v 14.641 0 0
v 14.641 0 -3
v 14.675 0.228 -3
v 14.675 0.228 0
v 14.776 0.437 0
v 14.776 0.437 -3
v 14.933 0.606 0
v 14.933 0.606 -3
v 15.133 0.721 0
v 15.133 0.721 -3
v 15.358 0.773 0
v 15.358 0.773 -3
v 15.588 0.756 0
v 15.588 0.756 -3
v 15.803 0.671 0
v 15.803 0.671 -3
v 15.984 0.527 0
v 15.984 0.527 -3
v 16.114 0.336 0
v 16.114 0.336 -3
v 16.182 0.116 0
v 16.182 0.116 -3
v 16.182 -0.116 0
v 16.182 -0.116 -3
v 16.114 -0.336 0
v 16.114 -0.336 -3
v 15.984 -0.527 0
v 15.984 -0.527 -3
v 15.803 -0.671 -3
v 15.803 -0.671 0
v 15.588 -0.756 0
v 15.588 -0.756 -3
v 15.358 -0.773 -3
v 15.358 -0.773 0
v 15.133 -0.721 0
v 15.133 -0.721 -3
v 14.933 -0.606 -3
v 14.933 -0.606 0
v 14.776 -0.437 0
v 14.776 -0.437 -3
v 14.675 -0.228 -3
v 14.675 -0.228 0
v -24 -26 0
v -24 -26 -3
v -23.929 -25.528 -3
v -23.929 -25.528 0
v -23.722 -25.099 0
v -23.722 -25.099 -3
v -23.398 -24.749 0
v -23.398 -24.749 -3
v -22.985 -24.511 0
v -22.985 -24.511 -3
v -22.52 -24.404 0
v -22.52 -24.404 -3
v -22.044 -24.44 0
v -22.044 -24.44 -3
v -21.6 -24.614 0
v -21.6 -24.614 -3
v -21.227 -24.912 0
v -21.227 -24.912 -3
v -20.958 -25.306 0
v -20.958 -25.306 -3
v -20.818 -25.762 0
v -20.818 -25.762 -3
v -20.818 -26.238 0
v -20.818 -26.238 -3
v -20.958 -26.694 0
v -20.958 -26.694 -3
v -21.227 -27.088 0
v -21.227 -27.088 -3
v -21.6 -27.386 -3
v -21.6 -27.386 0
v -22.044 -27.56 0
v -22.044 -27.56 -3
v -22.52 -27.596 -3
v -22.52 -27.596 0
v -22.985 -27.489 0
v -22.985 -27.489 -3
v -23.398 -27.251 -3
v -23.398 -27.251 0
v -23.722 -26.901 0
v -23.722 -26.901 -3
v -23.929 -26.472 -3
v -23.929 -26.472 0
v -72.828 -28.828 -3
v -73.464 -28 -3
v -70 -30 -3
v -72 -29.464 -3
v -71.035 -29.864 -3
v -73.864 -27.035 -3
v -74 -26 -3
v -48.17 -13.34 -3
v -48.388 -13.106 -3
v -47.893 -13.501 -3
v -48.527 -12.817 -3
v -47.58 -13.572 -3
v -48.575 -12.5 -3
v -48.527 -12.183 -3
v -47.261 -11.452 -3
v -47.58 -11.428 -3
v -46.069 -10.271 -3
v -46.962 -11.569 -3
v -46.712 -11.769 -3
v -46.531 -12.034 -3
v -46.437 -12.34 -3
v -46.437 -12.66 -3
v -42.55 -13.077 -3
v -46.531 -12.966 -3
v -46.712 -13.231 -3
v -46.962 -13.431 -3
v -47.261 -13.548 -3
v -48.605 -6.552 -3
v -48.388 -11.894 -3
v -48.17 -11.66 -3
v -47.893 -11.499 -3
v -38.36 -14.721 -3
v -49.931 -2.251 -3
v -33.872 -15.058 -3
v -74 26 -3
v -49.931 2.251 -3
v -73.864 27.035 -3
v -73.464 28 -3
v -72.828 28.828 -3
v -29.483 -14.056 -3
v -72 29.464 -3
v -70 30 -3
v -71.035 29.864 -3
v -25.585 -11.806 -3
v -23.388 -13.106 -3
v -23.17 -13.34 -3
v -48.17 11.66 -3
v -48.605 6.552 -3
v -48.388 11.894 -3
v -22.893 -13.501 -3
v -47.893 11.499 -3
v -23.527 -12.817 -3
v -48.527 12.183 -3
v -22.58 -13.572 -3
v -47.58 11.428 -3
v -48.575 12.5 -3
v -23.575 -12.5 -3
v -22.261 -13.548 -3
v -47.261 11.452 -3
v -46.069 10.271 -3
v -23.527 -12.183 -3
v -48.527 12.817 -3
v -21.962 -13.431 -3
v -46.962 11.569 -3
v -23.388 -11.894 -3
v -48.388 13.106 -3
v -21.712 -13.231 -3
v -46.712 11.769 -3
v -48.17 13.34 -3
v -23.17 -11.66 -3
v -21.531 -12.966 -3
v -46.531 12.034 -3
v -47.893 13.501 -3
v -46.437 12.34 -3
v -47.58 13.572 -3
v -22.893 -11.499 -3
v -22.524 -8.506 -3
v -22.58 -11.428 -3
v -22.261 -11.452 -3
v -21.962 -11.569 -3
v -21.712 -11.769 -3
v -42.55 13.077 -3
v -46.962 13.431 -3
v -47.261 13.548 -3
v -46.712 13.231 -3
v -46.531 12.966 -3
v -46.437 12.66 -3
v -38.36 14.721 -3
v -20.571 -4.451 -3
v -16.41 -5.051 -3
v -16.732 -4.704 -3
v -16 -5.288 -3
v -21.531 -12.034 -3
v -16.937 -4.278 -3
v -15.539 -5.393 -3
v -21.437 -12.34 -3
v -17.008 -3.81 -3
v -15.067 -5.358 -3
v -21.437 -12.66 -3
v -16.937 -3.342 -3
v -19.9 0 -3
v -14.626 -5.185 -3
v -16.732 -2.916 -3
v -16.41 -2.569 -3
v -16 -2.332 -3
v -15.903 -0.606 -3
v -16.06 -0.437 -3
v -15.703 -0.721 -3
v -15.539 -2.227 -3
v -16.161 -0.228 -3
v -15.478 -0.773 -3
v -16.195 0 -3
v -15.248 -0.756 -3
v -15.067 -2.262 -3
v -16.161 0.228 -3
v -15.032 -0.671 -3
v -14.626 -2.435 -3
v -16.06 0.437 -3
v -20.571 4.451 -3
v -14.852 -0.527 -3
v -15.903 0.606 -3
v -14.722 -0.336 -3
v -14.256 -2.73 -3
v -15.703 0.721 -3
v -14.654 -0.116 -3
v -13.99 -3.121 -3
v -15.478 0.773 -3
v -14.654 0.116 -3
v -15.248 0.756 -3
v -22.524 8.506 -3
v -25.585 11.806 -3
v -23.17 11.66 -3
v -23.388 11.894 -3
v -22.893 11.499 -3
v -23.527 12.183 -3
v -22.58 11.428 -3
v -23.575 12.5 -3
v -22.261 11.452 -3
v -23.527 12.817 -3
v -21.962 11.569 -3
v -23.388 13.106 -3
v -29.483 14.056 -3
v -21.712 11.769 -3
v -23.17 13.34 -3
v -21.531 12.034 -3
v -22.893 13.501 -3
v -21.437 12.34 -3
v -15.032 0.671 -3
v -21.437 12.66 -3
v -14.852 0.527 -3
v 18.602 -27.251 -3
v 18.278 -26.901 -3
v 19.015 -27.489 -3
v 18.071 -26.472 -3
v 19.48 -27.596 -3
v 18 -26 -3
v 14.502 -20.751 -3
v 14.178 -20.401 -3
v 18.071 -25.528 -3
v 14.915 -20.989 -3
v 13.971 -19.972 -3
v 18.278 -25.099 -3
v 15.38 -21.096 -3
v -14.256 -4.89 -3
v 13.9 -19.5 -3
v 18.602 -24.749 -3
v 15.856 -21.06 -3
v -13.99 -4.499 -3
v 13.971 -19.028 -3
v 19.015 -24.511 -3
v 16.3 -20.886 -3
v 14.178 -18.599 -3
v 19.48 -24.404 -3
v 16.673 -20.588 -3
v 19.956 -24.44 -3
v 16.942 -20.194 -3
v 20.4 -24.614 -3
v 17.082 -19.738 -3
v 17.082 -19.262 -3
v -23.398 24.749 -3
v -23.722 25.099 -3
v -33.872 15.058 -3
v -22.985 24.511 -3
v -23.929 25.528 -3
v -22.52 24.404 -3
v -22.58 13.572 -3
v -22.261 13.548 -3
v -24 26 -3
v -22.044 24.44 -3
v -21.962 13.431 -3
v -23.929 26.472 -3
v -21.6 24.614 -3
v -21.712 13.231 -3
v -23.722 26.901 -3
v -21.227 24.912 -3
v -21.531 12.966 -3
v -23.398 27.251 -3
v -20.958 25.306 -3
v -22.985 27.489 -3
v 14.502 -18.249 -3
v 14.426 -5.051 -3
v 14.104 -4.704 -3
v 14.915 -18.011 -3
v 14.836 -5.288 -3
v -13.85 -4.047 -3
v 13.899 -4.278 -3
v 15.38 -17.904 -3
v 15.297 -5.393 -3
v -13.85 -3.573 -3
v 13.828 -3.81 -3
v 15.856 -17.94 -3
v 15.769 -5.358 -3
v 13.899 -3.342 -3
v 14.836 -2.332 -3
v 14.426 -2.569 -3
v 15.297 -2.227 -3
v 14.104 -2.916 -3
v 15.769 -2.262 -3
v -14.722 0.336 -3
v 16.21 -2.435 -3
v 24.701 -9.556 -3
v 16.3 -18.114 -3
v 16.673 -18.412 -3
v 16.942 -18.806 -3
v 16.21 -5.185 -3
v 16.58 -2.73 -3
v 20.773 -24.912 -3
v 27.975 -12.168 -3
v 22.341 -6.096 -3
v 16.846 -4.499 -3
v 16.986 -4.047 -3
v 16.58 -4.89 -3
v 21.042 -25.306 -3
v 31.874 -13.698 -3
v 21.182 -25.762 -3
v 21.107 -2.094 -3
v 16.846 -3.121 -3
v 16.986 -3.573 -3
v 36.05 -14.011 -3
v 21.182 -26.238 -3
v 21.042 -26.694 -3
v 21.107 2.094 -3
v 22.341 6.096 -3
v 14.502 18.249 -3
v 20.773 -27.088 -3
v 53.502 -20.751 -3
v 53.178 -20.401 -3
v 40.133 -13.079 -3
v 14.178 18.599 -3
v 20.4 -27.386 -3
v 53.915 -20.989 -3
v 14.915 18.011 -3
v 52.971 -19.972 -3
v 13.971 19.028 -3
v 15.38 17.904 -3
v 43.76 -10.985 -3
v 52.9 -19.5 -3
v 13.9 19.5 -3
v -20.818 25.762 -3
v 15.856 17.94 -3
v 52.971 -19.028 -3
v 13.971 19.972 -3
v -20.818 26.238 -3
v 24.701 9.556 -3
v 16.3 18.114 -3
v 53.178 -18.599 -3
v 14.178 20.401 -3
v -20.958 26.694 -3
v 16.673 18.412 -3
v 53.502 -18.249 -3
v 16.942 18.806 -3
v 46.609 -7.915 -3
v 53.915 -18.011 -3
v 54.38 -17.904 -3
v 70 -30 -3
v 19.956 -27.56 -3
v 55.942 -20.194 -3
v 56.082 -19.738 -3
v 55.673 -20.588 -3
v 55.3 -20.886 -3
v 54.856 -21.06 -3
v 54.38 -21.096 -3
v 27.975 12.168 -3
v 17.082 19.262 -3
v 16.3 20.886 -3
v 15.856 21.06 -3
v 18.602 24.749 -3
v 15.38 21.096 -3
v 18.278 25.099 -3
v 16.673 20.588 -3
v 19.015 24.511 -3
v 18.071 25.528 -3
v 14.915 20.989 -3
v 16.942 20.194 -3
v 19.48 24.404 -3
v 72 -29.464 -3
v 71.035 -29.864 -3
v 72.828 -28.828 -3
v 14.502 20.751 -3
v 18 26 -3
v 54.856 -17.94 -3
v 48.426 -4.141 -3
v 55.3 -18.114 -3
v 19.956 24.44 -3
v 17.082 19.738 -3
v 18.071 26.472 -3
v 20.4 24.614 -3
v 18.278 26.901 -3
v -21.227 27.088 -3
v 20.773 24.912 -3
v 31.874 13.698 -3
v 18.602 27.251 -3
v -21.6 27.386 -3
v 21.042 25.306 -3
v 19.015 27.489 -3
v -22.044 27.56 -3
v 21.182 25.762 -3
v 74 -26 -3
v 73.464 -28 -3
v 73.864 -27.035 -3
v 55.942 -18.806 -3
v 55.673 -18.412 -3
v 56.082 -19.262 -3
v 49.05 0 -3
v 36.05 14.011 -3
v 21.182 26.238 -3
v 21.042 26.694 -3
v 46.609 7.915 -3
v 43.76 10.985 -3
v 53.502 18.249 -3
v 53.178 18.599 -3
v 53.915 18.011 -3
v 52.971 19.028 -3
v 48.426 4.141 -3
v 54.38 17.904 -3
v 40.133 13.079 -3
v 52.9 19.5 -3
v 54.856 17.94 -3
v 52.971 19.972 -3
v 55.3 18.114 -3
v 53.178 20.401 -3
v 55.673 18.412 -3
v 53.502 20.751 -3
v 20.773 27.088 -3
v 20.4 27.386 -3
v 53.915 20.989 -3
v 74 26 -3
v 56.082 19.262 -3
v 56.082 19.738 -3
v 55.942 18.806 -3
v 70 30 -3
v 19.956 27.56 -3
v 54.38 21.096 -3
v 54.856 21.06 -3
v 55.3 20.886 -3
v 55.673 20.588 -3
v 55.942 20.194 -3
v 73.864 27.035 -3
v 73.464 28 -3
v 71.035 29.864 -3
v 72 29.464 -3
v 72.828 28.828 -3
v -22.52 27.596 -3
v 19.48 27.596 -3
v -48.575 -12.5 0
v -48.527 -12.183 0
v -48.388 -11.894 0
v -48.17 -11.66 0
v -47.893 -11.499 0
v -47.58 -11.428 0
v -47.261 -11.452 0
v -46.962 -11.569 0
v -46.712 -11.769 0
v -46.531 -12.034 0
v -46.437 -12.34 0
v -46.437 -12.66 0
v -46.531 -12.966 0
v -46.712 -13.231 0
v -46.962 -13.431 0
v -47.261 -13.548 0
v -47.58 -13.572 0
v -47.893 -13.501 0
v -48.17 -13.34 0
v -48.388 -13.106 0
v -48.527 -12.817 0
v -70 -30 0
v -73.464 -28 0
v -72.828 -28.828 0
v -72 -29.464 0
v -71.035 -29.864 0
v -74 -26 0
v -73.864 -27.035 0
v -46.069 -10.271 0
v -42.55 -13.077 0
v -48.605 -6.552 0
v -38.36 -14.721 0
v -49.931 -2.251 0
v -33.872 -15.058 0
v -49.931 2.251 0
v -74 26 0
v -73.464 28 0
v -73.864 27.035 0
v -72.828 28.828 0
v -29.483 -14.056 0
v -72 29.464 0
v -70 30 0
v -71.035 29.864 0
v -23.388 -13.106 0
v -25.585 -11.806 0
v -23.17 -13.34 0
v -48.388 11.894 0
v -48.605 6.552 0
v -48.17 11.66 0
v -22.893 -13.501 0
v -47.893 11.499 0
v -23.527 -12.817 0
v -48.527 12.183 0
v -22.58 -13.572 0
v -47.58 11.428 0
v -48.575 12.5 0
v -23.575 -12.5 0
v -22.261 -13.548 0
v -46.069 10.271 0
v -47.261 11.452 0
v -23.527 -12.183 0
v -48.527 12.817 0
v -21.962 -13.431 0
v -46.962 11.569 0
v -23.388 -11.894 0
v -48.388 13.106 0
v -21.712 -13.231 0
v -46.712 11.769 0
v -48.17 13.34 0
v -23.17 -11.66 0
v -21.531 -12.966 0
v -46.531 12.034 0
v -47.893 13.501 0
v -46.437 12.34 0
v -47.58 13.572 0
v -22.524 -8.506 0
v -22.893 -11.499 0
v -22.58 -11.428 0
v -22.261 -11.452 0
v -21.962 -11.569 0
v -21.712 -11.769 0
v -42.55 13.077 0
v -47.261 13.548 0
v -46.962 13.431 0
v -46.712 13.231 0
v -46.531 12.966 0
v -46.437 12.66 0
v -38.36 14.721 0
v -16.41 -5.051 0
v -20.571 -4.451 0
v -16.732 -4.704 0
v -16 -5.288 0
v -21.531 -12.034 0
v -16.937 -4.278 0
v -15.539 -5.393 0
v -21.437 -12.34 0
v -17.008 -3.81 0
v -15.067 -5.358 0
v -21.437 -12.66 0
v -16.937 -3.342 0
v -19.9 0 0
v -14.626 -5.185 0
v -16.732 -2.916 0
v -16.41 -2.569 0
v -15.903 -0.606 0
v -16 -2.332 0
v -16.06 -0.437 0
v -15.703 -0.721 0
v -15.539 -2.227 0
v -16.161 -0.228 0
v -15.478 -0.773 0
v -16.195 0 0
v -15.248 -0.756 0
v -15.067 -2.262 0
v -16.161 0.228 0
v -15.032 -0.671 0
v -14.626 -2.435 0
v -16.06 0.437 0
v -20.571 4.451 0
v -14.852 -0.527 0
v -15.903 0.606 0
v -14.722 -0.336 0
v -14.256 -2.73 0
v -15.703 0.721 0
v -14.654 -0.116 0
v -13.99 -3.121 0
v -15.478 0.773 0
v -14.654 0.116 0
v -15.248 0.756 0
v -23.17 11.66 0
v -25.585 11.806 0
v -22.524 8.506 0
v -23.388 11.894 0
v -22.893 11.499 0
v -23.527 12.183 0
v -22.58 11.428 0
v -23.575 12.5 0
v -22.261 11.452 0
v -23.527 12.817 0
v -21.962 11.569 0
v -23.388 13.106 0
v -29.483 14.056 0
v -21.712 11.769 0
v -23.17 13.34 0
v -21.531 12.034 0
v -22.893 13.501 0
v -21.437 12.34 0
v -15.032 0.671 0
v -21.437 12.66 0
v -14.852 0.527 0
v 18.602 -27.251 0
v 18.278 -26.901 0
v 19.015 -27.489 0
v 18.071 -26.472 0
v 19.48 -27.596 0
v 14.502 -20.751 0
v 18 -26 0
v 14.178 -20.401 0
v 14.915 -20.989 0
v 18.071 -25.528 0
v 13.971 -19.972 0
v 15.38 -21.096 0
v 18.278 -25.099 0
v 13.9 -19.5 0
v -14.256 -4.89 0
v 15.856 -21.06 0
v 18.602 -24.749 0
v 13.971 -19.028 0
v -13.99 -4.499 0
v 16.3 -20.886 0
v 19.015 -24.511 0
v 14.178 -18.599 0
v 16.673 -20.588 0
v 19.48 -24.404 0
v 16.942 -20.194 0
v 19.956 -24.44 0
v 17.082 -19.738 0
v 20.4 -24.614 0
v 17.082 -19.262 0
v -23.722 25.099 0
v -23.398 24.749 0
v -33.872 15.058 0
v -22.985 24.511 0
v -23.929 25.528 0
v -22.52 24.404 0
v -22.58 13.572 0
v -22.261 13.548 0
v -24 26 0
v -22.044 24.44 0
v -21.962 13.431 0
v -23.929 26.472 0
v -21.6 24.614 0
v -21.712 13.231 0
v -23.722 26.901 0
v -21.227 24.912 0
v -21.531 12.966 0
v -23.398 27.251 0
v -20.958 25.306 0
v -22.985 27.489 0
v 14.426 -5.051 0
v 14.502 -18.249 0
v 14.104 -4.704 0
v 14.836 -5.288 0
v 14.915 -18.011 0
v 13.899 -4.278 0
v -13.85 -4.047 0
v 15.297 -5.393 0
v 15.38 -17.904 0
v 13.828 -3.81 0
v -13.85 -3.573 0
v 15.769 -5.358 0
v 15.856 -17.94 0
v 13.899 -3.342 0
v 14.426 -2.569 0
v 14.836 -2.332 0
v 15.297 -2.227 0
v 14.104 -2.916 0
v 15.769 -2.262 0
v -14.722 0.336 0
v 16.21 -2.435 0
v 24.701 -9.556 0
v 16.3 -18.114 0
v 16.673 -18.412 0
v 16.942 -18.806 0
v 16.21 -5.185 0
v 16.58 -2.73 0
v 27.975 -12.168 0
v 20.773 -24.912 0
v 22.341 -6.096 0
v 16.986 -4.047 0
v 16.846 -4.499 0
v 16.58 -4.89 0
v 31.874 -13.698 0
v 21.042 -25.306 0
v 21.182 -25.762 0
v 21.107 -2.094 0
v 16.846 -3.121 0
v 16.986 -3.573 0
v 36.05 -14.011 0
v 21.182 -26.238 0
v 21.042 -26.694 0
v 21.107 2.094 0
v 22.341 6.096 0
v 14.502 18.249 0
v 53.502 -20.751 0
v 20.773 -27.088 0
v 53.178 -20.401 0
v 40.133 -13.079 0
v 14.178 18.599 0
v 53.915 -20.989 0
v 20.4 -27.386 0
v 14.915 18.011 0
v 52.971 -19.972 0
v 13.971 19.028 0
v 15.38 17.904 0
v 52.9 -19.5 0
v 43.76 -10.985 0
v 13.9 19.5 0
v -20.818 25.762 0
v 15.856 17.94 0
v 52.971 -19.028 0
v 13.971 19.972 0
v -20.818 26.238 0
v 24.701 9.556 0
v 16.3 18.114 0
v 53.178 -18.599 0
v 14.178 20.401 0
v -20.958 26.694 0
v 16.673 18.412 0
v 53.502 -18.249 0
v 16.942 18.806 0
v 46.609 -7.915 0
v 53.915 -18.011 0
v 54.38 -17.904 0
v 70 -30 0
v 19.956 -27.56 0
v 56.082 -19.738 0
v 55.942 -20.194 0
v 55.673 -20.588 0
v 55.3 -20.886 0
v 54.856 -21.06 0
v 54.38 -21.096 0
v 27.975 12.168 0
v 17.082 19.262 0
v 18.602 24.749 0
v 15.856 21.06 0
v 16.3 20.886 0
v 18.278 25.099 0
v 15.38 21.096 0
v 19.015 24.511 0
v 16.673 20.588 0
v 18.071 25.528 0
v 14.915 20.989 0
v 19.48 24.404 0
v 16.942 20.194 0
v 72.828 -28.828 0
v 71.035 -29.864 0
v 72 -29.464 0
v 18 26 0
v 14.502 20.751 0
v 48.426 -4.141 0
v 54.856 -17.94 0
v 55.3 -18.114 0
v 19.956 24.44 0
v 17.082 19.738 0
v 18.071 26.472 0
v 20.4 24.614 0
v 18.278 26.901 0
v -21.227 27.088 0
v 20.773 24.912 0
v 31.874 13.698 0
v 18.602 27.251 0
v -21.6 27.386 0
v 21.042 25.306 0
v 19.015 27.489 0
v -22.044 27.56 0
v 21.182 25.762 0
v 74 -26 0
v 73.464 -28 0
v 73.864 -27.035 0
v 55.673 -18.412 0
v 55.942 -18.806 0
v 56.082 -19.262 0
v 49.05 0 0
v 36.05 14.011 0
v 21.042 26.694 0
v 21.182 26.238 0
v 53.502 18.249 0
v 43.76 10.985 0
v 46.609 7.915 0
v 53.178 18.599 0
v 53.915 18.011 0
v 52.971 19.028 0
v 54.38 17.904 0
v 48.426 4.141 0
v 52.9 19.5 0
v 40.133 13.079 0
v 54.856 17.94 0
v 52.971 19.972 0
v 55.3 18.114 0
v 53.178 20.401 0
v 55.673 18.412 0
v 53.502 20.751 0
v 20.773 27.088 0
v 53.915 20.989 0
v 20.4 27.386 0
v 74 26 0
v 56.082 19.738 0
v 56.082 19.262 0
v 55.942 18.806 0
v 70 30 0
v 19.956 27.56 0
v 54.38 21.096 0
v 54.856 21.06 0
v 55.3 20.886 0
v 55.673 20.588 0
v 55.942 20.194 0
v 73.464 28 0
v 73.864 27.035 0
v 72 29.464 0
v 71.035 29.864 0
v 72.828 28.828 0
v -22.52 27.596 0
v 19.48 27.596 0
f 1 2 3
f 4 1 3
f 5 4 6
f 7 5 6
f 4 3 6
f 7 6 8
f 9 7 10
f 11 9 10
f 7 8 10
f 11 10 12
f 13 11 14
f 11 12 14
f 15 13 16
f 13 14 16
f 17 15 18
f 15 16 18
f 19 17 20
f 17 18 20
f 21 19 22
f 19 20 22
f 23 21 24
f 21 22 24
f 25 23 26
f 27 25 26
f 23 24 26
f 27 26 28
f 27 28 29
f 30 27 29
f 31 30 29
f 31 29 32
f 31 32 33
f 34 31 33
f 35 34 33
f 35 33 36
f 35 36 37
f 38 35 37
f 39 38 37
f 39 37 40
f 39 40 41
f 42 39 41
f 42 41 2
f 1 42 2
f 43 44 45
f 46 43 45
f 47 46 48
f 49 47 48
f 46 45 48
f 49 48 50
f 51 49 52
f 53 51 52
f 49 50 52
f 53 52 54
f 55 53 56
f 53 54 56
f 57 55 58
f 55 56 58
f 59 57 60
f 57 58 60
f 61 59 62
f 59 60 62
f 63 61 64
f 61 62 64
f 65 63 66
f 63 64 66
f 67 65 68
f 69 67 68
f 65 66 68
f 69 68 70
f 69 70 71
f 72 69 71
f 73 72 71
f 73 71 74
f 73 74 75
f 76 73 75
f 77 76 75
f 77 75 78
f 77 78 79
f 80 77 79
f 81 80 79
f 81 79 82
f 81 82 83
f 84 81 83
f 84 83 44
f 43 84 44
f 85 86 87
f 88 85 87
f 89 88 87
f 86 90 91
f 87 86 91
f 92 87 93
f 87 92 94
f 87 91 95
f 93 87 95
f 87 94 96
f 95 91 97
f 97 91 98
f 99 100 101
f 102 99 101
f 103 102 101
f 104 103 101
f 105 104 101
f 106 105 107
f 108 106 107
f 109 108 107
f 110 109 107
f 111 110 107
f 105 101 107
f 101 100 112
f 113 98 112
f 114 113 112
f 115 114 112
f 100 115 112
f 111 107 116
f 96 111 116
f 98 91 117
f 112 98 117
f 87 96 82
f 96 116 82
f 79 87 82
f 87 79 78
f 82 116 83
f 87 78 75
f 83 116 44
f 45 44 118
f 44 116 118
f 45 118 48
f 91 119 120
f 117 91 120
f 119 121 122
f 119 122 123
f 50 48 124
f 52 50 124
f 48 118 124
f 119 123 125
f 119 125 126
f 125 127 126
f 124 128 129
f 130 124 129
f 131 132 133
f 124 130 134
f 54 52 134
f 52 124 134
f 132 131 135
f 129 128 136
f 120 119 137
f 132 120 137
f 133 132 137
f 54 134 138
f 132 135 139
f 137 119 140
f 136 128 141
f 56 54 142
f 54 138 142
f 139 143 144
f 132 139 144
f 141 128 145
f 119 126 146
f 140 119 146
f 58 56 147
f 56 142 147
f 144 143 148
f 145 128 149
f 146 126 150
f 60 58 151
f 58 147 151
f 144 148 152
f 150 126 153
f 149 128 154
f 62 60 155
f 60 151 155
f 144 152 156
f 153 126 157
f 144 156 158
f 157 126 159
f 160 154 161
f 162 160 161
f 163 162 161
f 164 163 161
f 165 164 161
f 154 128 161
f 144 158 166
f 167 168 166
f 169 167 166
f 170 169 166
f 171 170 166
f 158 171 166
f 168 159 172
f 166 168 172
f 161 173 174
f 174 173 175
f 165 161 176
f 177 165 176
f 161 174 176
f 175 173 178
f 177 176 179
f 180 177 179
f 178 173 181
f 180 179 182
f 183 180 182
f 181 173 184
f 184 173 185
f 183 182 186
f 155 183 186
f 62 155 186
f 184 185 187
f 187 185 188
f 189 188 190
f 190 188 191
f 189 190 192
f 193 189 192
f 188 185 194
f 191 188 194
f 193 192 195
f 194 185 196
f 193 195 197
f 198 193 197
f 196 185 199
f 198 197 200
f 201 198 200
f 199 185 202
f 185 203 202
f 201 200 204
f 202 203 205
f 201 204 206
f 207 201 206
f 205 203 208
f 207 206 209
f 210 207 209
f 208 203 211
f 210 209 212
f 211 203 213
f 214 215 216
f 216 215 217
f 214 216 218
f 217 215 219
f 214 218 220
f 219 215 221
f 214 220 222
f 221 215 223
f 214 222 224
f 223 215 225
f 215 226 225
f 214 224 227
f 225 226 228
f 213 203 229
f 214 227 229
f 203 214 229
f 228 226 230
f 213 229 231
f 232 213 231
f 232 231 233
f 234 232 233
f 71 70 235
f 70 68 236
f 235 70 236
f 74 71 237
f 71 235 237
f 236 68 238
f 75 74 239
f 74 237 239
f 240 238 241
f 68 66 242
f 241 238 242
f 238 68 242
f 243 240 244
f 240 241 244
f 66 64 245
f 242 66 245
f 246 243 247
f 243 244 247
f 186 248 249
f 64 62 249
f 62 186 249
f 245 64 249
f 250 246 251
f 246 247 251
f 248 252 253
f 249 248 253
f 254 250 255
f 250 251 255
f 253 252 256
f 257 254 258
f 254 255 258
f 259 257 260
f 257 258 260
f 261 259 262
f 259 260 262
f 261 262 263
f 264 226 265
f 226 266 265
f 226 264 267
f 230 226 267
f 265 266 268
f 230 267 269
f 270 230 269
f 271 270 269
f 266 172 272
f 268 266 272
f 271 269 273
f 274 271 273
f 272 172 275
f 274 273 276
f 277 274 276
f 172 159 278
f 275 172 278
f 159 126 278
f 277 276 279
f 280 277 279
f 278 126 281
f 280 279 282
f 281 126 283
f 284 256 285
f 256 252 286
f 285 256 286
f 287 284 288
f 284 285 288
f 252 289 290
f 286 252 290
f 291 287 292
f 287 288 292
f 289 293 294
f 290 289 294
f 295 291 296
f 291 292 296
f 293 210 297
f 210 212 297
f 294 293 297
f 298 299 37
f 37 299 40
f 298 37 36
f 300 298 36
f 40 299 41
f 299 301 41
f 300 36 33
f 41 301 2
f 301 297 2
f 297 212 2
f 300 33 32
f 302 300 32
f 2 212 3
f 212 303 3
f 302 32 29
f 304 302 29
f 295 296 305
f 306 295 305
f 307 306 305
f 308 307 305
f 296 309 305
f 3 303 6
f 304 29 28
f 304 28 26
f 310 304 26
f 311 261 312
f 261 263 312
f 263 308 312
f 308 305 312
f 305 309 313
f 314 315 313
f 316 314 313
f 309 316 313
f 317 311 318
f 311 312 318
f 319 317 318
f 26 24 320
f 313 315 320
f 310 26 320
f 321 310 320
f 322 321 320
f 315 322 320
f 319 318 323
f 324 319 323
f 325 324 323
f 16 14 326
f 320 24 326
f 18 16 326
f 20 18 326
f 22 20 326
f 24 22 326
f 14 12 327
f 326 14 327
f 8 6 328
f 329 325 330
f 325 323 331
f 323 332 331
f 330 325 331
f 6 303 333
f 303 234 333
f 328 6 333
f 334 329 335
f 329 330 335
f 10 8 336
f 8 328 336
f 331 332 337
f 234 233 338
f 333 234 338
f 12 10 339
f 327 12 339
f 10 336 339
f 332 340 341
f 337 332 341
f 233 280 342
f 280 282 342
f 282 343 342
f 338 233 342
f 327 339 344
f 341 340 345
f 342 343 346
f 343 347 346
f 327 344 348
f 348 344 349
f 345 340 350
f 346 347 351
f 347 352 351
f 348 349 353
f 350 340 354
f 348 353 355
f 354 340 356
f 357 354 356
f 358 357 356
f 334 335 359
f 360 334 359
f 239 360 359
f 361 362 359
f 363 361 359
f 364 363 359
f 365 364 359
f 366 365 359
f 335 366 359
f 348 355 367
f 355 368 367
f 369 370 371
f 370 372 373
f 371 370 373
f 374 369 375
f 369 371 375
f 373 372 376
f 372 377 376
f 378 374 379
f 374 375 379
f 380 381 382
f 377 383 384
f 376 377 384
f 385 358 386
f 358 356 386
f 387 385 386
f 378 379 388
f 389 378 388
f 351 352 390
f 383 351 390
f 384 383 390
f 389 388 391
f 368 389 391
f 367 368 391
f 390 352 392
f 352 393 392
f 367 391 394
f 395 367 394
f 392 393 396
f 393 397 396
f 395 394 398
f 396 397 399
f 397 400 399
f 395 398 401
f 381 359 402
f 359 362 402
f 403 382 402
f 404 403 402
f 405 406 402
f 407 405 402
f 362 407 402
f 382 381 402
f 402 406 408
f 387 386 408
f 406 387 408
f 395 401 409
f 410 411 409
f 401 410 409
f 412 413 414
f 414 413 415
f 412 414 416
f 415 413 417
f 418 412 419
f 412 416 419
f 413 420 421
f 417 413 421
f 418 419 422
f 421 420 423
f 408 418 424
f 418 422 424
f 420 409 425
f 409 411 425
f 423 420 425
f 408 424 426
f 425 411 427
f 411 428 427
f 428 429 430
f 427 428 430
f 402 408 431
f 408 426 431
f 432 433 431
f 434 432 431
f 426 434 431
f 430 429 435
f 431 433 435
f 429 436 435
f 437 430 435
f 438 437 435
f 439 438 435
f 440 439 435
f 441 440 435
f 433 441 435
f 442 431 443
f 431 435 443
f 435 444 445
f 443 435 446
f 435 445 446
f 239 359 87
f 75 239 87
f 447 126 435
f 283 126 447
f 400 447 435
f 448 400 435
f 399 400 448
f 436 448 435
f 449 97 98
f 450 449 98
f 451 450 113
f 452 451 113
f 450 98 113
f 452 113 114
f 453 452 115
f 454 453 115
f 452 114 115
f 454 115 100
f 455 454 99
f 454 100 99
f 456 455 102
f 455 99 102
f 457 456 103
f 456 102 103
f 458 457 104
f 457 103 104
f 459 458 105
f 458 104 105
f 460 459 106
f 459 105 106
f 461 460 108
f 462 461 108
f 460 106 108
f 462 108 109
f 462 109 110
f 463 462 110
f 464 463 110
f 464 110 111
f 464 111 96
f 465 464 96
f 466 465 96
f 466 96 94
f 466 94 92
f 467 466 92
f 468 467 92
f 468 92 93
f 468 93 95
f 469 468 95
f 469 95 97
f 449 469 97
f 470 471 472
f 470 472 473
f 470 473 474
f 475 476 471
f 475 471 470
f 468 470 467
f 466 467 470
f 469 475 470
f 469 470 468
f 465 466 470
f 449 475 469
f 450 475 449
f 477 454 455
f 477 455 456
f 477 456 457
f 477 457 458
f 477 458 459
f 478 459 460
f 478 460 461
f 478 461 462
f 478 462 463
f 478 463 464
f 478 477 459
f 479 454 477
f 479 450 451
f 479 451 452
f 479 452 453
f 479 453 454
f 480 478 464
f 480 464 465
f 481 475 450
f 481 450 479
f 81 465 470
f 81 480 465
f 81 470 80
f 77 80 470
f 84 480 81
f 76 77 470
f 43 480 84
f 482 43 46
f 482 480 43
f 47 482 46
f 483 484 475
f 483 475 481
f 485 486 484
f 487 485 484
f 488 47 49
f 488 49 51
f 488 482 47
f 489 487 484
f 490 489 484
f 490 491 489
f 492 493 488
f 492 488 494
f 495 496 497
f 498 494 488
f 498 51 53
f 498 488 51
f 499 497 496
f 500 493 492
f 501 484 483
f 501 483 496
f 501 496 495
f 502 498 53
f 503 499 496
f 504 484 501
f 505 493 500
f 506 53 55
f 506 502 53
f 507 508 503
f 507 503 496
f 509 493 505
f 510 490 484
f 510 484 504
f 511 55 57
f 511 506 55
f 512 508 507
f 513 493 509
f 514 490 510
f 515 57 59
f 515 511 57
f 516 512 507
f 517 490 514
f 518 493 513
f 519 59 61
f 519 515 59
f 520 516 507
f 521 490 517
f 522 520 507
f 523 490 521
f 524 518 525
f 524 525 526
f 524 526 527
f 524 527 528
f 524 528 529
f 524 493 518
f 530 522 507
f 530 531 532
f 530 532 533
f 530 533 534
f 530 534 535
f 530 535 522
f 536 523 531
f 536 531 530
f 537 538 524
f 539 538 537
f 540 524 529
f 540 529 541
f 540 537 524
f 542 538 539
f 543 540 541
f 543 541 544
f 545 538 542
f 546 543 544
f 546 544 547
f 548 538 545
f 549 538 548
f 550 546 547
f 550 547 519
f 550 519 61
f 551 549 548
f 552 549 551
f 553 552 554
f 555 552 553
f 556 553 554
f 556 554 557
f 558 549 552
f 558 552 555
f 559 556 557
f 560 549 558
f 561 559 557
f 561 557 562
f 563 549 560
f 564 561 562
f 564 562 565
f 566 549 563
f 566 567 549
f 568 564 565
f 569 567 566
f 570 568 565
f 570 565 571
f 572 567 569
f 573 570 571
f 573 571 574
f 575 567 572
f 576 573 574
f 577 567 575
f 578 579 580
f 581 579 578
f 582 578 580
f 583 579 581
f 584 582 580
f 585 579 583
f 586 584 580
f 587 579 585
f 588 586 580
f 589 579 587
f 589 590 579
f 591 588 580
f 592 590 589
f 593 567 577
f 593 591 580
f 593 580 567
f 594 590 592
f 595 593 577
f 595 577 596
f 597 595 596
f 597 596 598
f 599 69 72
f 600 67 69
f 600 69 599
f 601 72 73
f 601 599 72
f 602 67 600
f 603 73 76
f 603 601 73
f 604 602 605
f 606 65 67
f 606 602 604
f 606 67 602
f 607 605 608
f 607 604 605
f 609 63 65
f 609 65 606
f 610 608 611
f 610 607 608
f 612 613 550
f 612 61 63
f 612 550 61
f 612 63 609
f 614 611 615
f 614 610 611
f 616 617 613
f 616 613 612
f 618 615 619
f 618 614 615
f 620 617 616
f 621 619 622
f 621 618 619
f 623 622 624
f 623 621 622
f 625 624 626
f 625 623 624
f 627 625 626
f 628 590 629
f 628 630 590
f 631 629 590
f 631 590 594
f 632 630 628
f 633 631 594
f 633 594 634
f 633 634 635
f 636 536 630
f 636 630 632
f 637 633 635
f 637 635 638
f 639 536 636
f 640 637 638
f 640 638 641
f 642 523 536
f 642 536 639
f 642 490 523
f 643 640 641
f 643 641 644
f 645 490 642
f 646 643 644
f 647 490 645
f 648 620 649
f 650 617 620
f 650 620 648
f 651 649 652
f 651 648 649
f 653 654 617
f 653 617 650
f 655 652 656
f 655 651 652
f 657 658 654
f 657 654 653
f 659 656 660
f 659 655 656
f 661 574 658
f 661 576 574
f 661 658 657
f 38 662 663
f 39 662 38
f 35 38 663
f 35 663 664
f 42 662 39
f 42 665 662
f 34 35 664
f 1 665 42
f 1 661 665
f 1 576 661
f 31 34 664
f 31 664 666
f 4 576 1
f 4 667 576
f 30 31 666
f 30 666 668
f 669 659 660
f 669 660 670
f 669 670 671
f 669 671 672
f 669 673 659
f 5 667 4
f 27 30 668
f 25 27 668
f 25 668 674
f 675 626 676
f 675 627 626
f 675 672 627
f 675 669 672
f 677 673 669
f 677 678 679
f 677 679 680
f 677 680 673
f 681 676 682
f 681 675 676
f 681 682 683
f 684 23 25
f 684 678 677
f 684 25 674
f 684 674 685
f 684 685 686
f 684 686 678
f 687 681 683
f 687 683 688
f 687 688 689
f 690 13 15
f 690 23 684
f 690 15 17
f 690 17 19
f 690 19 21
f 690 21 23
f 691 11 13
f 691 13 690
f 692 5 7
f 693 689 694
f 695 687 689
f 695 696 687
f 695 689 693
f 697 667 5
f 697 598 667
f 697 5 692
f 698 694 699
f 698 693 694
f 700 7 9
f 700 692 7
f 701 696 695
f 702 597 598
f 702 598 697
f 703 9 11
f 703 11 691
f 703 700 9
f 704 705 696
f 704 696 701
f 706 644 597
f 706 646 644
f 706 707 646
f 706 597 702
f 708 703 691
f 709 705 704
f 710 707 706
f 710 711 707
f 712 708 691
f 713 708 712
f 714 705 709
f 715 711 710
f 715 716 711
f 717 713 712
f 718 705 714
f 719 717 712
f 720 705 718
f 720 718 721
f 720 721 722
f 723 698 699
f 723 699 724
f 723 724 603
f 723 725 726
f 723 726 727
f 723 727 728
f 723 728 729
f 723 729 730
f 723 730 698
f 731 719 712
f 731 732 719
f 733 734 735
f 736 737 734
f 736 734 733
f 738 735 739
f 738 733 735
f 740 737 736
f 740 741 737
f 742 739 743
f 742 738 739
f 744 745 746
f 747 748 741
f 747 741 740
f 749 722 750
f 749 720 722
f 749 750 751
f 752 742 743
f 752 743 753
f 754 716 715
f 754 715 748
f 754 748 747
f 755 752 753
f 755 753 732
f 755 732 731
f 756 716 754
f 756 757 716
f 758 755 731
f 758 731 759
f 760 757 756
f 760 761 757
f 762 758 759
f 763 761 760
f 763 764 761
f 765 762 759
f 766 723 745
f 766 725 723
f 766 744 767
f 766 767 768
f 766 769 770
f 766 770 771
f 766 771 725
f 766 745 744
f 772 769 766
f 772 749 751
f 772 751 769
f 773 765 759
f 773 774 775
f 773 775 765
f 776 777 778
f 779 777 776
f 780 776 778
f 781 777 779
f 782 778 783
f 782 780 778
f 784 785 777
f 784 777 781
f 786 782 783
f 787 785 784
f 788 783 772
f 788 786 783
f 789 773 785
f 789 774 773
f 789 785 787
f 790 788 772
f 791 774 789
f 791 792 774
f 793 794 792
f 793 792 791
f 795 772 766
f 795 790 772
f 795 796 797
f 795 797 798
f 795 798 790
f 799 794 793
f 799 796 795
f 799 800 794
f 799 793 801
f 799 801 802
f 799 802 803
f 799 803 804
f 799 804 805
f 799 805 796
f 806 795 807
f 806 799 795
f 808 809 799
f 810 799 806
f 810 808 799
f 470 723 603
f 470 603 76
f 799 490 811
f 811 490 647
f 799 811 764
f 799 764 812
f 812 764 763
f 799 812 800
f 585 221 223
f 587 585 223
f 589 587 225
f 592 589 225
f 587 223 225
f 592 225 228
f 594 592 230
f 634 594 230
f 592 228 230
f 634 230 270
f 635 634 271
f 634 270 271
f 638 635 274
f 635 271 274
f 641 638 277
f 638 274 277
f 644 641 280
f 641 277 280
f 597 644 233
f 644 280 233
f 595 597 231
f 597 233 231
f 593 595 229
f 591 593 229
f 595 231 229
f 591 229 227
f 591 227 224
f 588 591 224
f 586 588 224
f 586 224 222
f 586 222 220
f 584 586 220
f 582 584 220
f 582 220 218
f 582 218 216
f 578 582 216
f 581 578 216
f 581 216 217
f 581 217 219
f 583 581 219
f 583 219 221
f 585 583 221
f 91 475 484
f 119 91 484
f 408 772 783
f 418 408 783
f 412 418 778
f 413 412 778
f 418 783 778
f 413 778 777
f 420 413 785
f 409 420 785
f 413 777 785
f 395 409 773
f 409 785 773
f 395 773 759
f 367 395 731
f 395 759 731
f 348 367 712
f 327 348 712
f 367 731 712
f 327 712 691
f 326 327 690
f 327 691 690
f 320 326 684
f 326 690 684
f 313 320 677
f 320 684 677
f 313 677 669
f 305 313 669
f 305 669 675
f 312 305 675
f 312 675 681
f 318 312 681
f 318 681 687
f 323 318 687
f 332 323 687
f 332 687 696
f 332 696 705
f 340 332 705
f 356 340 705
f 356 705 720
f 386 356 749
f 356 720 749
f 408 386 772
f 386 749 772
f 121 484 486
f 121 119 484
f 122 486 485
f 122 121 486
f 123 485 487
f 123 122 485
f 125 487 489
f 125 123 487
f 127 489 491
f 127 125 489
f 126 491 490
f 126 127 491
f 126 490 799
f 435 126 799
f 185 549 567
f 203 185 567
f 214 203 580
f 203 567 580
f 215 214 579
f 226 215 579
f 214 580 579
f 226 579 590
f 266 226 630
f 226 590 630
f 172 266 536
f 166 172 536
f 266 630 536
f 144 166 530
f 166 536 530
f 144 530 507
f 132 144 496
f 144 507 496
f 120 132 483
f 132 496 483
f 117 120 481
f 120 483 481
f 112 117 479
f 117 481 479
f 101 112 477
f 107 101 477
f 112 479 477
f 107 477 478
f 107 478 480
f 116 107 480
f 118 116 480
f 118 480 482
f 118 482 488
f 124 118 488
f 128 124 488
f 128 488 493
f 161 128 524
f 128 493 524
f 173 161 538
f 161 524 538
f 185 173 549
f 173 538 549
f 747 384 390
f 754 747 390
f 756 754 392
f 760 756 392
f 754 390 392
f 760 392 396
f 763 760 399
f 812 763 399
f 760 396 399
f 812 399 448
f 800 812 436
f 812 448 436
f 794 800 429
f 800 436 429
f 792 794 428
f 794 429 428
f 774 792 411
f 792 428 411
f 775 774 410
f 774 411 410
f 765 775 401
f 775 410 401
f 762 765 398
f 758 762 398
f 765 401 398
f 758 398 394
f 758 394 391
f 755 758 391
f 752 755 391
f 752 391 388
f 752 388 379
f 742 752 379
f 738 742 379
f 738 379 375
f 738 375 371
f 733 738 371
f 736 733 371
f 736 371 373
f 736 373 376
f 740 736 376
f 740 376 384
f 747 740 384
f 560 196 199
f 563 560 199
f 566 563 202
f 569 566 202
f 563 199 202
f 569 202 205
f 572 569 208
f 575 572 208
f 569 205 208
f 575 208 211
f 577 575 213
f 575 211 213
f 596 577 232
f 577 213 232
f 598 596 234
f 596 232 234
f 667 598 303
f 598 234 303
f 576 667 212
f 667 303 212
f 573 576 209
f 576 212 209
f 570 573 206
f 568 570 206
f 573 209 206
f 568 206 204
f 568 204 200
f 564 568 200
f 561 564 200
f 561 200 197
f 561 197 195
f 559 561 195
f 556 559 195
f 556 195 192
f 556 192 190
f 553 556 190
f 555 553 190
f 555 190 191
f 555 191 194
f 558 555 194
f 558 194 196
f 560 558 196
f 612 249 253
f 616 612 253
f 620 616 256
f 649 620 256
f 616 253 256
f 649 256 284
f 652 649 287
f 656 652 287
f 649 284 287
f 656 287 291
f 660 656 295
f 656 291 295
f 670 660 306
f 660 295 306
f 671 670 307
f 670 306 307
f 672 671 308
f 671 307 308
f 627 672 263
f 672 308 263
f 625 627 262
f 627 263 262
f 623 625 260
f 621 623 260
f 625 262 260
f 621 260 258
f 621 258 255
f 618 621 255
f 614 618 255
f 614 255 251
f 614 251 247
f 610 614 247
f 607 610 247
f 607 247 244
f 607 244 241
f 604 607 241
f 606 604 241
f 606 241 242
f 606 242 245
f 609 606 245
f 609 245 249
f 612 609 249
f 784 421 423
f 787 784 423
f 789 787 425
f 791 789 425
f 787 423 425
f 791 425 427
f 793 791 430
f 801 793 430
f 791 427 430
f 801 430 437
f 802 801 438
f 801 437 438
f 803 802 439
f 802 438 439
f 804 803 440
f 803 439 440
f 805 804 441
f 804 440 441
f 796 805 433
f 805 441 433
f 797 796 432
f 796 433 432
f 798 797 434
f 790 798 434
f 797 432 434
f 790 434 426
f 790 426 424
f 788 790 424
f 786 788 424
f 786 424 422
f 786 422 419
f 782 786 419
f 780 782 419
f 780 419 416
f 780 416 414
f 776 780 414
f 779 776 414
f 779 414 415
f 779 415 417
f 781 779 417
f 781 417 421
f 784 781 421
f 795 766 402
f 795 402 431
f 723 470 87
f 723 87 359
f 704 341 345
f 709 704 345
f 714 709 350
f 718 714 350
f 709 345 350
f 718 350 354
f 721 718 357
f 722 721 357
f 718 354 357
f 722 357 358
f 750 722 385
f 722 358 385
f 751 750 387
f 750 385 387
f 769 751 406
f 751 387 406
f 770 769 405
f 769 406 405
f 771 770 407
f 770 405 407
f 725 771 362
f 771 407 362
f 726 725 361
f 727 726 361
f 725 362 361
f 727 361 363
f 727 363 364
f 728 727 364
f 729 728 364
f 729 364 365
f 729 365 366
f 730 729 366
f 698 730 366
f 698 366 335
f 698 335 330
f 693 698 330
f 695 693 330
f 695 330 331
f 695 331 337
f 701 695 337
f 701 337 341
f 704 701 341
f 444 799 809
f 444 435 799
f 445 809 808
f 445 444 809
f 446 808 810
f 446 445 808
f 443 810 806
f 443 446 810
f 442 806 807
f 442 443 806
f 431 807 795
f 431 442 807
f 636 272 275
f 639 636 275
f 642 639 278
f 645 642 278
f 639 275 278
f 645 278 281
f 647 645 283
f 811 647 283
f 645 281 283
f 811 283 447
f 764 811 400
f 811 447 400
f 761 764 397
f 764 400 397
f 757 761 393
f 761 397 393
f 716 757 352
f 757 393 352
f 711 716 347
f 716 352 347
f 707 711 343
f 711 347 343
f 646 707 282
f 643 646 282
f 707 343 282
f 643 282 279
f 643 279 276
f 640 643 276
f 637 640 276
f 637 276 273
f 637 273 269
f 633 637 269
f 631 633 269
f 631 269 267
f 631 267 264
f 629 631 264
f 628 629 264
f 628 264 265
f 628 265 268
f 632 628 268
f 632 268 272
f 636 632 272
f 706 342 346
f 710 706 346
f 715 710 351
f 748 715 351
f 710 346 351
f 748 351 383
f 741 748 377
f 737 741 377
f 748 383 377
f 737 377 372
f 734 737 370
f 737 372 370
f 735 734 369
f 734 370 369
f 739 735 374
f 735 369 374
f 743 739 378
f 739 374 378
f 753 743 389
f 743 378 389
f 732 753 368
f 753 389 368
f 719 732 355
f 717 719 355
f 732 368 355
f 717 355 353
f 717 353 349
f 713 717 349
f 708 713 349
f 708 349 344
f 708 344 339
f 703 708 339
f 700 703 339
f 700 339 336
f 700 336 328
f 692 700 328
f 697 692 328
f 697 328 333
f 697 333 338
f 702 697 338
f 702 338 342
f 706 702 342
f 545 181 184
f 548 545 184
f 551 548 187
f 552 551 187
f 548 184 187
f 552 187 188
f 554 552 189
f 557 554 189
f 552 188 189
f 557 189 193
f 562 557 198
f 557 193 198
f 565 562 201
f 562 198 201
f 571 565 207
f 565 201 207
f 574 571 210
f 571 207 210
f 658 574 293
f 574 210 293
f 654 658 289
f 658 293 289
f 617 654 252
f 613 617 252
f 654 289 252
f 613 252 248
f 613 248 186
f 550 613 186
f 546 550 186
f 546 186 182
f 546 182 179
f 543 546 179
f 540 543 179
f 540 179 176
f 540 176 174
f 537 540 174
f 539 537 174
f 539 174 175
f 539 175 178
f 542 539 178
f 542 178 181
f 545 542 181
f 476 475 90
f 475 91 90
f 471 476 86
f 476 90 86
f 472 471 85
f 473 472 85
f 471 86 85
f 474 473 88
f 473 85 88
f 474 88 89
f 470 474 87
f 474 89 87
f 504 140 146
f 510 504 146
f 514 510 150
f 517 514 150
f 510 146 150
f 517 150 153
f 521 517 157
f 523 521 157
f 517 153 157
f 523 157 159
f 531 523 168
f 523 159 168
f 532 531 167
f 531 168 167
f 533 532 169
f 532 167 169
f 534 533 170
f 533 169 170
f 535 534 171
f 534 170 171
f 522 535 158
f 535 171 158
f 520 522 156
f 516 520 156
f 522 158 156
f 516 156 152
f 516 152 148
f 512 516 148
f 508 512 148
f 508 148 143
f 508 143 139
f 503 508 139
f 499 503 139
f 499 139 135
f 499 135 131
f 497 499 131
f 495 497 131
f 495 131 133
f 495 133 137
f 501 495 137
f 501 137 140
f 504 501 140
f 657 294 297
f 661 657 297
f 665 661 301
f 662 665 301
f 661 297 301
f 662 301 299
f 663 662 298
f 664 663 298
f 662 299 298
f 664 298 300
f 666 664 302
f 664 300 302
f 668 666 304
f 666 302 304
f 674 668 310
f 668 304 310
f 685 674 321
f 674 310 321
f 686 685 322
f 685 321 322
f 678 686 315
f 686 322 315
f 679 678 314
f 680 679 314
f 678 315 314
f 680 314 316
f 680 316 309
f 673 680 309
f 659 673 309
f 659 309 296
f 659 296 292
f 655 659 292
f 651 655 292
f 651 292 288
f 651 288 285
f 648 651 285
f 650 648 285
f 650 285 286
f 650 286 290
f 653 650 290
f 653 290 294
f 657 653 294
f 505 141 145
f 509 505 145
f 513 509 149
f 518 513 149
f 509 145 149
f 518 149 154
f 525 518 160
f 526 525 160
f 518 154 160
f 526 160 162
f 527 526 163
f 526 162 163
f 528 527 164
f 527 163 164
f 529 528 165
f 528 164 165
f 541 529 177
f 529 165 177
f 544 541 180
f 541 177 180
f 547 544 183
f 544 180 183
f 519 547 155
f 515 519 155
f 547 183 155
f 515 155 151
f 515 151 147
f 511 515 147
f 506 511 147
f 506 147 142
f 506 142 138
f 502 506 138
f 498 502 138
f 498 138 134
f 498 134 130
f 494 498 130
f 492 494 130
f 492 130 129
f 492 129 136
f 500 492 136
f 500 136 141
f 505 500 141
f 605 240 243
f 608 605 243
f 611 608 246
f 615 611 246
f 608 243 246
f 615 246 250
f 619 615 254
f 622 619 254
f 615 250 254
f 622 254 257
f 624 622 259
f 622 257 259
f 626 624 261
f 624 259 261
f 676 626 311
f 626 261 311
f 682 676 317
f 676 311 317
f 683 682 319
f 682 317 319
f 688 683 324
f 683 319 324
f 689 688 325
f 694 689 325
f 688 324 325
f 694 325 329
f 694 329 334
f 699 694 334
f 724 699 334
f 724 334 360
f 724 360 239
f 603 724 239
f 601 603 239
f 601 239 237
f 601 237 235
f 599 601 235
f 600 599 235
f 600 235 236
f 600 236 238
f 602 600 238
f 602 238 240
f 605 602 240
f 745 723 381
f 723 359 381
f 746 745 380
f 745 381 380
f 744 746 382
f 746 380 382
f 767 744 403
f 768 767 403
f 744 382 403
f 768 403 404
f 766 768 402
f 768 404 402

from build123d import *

# Parameters (mm, degrees)
SKETCH3_W           = 148
SKETCH3_H           = 60
SKETCH3_R           = 15.1
SKETCH3_R_2         = 14.05
BOSS_EXTRUDE2_DEPTH = 3
FILLET1_R           = 4
EVK4_HOLES_D        = 2.15
FLIR_HOLES_D        = 3.2
VN_MOUNT_HOLES_D    = 3.175
VN_REF_HOLES_D      = 1.55
PCB_MOUNT_HOLES_D   = 3.2


with BuildPart() as part:
    # Sketch3 → Boss-Extrude2 (new body)
    with BuildSketch(Plane.XY):
        Rectangle(SKETCH3_W, SKETCH3_H)
        with Locations((-35, 0)):
            Circle(SKETCH3_R, mode=Mode.SUBTRACT)
        with Locations((35, 0)):
            Circle(SKETCH3_R_2, mode=Mode.SUBTRACT)
    extrude(amount=-BOSS_EXTRUDE2_DEPTH)

    # Fillet1
    fillet1_edges = [part.edges().sort_by_distance(p)[0] for p in [
        (-74, 30, -1.5),
        (74, 30, -1.5),
        (74, -30, -1.5),
        (-74, -30, -1.5),
    ]]
    fillet(fillet1_edges, radius=FILLET1_R)

    # EVK4-Holes (through all)
    with Locations(Plane.XY):
        with Locations((-47.5, 12.5), (-22.5, 12.5), (-22.5, -12.5), (-47.5, -12.5)):
            Hole(EVK4_HOLES_D / 2)

    # FLIR-Holes (through all)
    with Locations(Plane.XY):
        with Locations((15.5, 19.5), (54.5, 19.5), (54.5, -19.5), (15.5, -19.5)):
            Hole(FLIR_HOLES_D / 2)

    # VN-Mount-Holes (through all)
    with Locations(Plane.XY):
        with Locations((-15.42, -3.81), (15.4159, -3.81)):
            Hole(VN_MOUNT_HOLES_D / 2)

    # VN-Ref-Holes (through all)
    with Locations(Plane.XY):
        with Locations((-15.42, 0), (15.4159, 0)):
            Hole(VN_REF_HOLES_D / 2)

    # PCB-Mount-Holes (through all)
    with Locations(Plane.XY):
        with Locations((-22.4, 26), (19.6, 26), (19.6, -26), (-22.4, -26)):
            Hole(PCB_MOUNT_HOLES_D / 2)


solid = part.part
